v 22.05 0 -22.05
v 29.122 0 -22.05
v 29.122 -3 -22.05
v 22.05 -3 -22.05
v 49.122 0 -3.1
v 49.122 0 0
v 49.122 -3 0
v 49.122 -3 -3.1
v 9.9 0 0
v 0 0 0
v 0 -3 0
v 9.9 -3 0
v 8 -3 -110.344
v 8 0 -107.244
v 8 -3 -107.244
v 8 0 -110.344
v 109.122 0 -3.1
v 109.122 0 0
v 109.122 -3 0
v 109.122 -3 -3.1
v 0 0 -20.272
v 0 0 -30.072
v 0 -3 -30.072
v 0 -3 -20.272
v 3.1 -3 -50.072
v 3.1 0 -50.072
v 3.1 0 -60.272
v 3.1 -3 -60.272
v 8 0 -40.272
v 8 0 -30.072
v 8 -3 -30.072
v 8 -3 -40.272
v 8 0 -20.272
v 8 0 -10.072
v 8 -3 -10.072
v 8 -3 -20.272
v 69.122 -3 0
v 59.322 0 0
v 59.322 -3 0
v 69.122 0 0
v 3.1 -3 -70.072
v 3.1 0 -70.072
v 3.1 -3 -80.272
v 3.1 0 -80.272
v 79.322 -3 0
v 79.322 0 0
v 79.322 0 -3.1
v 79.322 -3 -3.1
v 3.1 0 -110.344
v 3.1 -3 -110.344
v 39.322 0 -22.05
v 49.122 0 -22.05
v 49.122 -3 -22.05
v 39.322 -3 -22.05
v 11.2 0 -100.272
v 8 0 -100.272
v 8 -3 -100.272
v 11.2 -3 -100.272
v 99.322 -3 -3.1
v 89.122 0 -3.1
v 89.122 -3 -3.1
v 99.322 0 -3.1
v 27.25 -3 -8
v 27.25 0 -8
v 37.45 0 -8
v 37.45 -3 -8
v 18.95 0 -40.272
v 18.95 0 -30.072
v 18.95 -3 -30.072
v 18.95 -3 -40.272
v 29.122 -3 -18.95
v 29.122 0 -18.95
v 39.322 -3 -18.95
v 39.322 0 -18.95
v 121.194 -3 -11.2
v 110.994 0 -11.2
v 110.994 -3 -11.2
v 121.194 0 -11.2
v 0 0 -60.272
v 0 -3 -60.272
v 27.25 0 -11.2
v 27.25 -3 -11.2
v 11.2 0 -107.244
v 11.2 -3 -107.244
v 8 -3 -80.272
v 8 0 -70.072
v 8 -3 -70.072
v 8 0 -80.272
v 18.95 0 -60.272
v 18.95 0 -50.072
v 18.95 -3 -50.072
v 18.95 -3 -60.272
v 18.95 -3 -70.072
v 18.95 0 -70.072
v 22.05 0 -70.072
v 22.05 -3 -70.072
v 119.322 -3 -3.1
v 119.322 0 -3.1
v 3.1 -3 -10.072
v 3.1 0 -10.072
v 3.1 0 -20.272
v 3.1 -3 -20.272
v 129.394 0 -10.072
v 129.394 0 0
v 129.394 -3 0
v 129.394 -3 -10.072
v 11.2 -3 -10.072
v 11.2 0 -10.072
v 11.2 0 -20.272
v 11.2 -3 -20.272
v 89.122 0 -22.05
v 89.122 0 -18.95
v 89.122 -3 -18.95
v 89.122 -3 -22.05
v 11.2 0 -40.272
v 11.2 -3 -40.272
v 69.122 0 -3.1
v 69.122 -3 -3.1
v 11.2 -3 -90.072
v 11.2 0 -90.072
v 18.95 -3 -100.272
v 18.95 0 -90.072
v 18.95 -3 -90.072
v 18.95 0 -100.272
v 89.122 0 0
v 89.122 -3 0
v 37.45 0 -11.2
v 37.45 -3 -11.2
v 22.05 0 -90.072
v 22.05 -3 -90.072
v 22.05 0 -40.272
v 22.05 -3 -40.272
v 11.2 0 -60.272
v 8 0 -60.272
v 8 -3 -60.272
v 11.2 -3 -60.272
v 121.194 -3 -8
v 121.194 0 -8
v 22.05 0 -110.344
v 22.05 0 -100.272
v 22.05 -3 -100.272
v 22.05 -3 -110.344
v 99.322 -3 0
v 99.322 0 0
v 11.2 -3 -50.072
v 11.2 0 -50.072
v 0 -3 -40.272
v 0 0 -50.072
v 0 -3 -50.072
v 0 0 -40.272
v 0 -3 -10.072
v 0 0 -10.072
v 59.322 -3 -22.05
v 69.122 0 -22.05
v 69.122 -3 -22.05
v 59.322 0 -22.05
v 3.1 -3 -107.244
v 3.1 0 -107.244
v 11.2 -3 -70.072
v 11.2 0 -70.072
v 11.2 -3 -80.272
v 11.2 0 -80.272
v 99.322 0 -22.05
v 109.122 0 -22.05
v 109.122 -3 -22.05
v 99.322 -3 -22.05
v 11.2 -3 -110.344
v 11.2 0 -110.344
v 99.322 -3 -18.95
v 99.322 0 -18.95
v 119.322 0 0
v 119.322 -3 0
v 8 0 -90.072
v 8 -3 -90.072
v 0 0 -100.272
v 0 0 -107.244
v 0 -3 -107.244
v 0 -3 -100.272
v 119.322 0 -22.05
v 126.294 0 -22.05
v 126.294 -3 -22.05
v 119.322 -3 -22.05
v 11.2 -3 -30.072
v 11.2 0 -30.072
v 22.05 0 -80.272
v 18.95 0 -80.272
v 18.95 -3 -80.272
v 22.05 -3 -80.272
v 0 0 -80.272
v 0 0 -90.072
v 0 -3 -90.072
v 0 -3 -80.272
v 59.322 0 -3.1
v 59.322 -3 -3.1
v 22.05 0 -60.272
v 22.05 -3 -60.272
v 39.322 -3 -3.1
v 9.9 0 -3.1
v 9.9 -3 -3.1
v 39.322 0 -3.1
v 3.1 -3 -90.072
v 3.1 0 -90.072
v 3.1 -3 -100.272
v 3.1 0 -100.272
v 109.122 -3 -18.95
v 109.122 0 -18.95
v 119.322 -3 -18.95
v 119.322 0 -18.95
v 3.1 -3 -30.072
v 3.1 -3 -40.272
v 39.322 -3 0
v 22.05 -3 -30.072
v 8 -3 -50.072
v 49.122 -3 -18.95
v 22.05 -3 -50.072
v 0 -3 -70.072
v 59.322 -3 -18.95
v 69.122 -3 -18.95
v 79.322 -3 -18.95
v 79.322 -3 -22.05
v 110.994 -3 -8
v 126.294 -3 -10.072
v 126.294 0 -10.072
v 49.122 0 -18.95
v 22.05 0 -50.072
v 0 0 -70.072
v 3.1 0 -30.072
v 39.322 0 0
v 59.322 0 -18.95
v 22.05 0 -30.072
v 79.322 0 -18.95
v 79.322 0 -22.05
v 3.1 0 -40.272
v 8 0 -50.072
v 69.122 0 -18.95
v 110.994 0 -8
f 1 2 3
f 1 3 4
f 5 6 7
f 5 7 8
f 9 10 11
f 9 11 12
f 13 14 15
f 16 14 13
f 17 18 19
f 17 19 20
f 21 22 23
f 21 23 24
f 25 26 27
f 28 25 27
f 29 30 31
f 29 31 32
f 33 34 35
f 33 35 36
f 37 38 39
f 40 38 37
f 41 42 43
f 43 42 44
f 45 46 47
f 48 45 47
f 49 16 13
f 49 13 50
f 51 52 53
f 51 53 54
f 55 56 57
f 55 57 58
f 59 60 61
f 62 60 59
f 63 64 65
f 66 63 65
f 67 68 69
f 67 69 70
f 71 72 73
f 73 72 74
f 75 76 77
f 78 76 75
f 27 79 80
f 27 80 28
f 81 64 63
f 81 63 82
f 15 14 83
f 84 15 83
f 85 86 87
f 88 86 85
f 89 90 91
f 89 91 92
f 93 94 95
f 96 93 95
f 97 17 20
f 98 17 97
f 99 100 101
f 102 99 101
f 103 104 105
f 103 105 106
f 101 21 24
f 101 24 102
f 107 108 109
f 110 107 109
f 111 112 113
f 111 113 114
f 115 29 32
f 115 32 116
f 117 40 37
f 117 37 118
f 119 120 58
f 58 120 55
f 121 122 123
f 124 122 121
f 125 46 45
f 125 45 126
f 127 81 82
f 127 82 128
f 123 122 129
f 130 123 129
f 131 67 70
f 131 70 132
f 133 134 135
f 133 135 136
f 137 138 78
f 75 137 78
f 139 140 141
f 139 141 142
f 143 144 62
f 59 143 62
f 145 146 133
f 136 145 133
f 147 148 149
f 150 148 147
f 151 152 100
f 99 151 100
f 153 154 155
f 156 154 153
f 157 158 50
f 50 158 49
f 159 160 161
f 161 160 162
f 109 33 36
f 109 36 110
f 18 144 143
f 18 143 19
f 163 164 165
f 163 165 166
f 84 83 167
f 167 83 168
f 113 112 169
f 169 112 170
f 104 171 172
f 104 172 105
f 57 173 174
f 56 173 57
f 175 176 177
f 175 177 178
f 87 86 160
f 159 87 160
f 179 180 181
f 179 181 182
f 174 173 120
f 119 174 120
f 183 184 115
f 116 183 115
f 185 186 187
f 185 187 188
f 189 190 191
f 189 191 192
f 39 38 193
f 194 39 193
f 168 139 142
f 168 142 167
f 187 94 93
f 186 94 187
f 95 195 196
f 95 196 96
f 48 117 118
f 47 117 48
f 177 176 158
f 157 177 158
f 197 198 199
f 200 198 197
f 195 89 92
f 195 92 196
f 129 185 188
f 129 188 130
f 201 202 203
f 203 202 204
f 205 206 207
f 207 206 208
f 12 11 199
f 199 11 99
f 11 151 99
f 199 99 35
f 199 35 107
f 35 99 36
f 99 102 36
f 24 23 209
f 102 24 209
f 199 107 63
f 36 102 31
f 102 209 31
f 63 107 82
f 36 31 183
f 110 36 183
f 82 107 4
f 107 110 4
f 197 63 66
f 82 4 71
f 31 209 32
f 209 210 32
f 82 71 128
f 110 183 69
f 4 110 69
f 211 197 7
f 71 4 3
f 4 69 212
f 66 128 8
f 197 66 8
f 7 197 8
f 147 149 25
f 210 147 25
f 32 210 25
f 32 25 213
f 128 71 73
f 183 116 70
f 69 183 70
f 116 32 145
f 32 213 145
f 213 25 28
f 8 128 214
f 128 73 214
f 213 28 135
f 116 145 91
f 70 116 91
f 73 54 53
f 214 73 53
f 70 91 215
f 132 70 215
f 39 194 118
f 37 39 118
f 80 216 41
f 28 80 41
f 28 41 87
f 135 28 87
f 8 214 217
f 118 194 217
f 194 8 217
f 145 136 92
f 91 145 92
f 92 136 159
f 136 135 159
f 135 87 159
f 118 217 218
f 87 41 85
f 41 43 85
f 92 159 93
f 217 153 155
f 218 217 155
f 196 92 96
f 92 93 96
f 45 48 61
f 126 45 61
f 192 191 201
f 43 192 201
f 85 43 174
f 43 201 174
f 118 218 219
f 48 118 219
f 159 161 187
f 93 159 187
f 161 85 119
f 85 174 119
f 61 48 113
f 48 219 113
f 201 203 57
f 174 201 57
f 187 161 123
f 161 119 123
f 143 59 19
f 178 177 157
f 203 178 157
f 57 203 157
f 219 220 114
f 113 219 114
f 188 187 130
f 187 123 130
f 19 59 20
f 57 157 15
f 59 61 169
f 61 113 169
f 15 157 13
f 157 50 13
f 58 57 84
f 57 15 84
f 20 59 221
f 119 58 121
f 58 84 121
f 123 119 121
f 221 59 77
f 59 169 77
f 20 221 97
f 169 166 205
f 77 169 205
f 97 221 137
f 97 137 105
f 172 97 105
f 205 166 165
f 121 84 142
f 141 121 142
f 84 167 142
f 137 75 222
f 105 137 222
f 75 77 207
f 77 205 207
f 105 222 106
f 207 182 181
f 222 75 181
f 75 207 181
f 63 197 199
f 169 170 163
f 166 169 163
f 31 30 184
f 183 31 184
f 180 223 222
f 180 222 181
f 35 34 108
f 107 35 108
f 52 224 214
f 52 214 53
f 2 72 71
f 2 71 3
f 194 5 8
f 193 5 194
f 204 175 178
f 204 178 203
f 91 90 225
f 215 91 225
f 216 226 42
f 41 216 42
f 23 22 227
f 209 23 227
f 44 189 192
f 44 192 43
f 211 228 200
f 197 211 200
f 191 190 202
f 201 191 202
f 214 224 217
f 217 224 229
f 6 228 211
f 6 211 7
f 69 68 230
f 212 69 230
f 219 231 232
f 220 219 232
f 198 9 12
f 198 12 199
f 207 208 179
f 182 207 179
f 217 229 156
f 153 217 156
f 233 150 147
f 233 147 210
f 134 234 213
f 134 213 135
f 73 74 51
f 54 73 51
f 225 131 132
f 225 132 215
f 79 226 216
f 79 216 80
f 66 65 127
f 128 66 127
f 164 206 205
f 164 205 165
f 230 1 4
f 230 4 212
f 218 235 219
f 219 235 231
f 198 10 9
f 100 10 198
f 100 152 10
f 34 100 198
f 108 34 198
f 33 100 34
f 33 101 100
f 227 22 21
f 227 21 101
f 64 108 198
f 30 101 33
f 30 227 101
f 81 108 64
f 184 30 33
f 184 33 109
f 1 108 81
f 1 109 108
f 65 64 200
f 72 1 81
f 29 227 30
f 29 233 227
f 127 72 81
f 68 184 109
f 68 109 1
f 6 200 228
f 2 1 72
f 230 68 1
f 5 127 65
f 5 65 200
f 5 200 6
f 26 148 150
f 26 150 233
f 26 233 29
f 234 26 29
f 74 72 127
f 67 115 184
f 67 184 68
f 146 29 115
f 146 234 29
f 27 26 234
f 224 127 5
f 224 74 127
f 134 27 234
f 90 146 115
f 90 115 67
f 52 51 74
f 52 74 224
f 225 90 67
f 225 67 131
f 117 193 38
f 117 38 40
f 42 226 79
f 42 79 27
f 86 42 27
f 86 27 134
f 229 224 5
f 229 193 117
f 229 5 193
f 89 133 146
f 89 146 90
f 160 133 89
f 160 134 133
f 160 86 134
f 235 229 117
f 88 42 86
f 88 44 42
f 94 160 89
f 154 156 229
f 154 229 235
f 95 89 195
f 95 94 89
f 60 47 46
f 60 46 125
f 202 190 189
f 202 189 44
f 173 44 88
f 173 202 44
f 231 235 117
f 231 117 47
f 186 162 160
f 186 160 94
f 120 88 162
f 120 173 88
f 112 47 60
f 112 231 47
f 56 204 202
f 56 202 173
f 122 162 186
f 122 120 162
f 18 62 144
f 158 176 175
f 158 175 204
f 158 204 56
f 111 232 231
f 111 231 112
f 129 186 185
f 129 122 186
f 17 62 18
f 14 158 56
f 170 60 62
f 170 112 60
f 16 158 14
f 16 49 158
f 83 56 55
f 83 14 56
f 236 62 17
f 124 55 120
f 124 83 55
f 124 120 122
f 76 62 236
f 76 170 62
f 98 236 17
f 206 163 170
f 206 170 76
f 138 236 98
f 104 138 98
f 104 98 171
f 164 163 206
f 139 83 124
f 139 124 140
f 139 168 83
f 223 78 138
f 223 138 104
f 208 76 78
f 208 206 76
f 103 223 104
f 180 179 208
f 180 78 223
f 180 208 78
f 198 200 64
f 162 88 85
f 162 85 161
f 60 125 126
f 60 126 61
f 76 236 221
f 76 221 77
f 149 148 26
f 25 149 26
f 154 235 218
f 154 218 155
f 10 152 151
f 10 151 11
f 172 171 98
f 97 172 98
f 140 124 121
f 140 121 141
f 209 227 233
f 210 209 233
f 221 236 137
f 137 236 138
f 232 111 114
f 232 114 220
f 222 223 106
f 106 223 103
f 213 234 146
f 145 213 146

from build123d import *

# Parameters (mm, degrees)
BOSS_EXTRUDE1_DEPTH = 3
SKETCH4_W           = 10.2
SKETCH4_H           = 3.2
SKETCH4_W_2         = 3.2
SKETCH4_H_2         = 10.2
SKETCH4_W_3         = 29.422217102
SKETCH4_H_3         = 12.077782898
CUT_EXTRUDE1_DEPTH  = 4


with BuildPart() as part:
    # Sketch1 → Boss-Extrude1 (new body)
    with BuildSketch(Plane(origin=(0, 0, 0), x_dir=(1, 0, 0), z_dir=(0, 1, 0))):
        Polygon((129.394434203, 22.05), (22.05, 22.05), (22.05, 110.344434203), (0, 110.344434203), (0, 0), (129.394434203, 0), align=None)
    extrude(amount=-BOSS_EXTRUDE1_DEPTH)

    # Sketch4 → Cut-Extrude1 (cut, through all)
    with BuildSketch(Plane(origin=(0, 0, 0), x_dir=(1, 0, 0), z_dir=(0, 1, 0))):
        with Locations((54.222217102, 20.55)):
            Rectangle(SKETCH4_W, SKETCH4_H)
        with Locations((74.222217102, 20.55)):
            Rectangle(SKETCH4_W, SKETCH4_H)
        with Locations((114.222217102, 1.5)):
            Rectangle(SKETCH4_W, SKETCH4_H)
        with Locations((1.5, 15.172217102)):
            Rectangle(SKETCH4_W_2, SKETCH4_H_2)
        with Locations((34.222217102, 20.55)):
            Rectangle(SKETCH4_W, SKETCH4_H)
        with Locations((24.611108551, 1.5)):
            Rectangle(SKETCH4_W_3, SKETCH4_H)
        with Locations((32.35, 9.6)):
            Rectangle(SKETCH4_W, SKETCH4_H)
        with Locations((54.222217102, 1.5)):
            Rectangle(SKETCH4_W, SKETCH4_H)
        with Locations((74.222217102, 1.5)):
            Rectangle(SKETCH4_W, SKETCH4_H)
        with Locations((9.6, 15.172217102)):
            Rectangle(SKETCH4_W_2, SKETCH4_H_2)
        with Locations((1.5, 35.172217102)):
            Rectangle(SKETCH4_W_2, SKETCH4_H_2)
        with Locations((9.6, 35.172217102)):
            Rectangle(SKETCH4_W_2, SKETCH4_H_2)
        with Locations((20.55, 35.172217102)):
            Rectangle(SKETCH4_W_2, SKETCH4_H_2)
        with Locations((1.5, 108.844434203)):
            Rectangle(SKETCH4_W_2, SKETCH4_H)
        with Locations((9.6, 108.844434203)):
            Rectangle(SKETCH4_W_2, SKETCH4_H)
        with Locations((9.6, 95.172217102)):
            Rectangle(SKETCH4_W_2, SKETCH4_H_2)
        with Locations((1.5, 95.172217102)):
            Rectangle(SKETCH4_W_2, SKETCH4_H_2)
        with Locations((1.5, 75.172217102)):
            Rectangle(SKETCH4_W_2, SKETCH4_H_2)
        with Locations((9.6, 75.172217102)):
            Rectangle(SKETCH4_W_2, SKETCH4_H_2)
        with Locations((20.55, 95.172217102)):
            Rectangle(SKETCH4_W_2, SKETCH4_H_2)
        with Locations((20.55, 75.172217102)):
            Rectangle(SKETCH4_W_2, SKETCH4_H_2)
        with Locations((1.5, 55.172217102)):
            Rectangle(SKETCH4_W_2, SKETCH4_H_2)
        with Locations((9.6, 55.172217102)):
            Rectangle(SKETCH4_W_2, SKETCH4_H_2)
        with Locations((20.55, 55.172217102)):
            Rectangle(SKETCH4_W_2, SKETCH4_H_2)
        with Locations((127.894434203, 16.111108551)):
            Rectangle(SKETCH4_W_2, SKETCH4_H_3)
        with Locations((94.222217102, 1.5)):
            Rectangle(SKETCH4_W, SKETCH4_H)
        with Locations((114.222217102, 20.55)):
            Rectangle(SKETCH4_W, SKETCH4_H)
        with Locations((94.222217102, 20.55)):
            Rectangle(SKETCH4_W, SKETCH4_H)
        with Locations((116.094434203, 9.6)):
            Rectangle(SKETCH4_W, SKETCH4_H)
    extrude(amount=-CUT_EXTRUDE1_DEPTH, mode=Mode.SUBTRACT)


solid = part.part
